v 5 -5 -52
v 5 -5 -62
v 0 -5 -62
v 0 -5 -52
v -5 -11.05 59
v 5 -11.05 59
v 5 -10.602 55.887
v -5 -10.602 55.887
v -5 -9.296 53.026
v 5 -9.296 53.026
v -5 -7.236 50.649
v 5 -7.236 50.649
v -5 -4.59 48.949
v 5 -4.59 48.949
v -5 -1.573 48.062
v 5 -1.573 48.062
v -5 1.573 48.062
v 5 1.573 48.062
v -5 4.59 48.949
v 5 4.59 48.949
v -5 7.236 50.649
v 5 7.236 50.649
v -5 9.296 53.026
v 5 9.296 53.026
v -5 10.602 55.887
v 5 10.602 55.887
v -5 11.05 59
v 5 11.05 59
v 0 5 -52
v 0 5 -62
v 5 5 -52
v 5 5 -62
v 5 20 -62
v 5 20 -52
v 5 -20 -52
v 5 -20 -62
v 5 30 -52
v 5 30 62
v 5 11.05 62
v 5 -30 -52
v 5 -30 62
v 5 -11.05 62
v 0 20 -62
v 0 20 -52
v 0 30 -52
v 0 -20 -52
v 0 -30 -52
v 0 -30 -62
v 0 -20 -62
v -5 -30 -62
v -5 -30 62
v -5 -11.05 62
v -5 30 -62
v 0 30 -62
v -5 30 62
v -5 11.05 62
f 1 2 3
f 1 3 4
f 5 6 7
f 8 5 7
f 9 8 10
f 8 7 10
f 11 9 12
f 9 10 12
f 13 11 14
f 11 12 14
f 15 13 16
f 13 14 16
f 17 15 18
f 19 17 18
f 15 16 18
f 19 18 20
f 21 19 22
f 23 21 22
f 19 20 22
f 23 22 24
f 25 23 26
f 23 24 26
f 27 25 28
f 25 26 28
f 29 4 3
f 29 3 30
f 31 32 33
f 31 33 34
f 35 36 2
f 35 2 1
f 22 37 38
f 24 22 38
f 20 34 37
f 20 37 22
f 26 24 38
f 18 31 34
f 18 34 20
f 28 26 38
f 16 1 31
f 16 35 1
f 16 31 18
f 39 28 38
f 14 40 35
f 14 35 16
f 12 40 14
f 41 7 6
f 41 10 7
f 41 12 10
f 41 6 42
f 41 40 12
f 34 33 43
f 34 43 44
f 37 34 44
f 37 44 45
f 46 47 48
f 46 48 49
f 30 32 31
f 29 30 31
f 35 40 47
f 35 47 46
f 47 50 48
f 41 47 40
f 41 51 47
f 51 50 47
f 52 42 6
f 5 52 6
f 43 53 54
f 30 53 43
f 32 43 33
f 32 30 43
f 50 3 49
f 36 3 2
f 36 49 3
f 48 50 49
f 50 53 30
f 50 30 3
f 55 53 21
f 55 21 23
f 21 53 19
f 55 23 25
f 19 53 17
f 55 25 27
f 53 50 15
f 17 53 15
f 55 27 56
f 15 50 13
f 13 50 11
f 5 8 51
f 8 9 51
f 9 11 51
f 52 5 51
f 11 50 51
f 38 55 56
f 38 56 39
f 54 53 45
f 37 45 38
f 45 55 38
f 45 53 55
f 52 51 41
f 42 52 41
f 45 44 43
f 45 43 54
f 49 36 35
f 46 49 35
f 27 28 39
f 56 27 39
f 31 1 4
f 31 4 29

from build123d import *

# Parameters (mm, degrees)
F0_W     = 10
F0_H     = 124
F1_DEPTH = 30
F3_DEPTH = 10
F4_W     = 10
F4_H     = 10
F5_DEPTH = 5


with BuildPart() as f1:
    # F0 (on Front) → F1 (new body, symmetric)
    with BuildSketch(Plane.XZ):
        Rectangle(F0_W, F0_H)
    extrude(amount=F1_DEPTH, both=True)

    # F2 (on face) → F3 (cut)
    with BuildSketch(Plane.YZ.offset(5)):
        with BuildLine():
            Line((-11.05, 62), (-11.05, 59))
            ThreePointArc((-11.05, 59), (0, 47.95), (11.05, 59))
            Line((11.05, 59), (11.05, 62))
            Line((11.05, 62), (-11.05, 62))
        make_face()
    extrude(amount=-F3_DEPTH, mode=Mode.SUBTRACT)

    # F4 (on face) → F5 (cut)
    with BuildSketch(Plane.YZ.offset(5)):
        with Locations((-25, -57)):
            Rectangle(F4_W, F4_H)
        with Locations((25, -57)):
            Rectangle(F4_W, F4_H)
        with Locations((0, -57)):
            Rectangle(F4_W, F4_H)
    extrude(amount=-F5_DEPTH, mode=Mode.SUBTRACT)


solid = f1.part
